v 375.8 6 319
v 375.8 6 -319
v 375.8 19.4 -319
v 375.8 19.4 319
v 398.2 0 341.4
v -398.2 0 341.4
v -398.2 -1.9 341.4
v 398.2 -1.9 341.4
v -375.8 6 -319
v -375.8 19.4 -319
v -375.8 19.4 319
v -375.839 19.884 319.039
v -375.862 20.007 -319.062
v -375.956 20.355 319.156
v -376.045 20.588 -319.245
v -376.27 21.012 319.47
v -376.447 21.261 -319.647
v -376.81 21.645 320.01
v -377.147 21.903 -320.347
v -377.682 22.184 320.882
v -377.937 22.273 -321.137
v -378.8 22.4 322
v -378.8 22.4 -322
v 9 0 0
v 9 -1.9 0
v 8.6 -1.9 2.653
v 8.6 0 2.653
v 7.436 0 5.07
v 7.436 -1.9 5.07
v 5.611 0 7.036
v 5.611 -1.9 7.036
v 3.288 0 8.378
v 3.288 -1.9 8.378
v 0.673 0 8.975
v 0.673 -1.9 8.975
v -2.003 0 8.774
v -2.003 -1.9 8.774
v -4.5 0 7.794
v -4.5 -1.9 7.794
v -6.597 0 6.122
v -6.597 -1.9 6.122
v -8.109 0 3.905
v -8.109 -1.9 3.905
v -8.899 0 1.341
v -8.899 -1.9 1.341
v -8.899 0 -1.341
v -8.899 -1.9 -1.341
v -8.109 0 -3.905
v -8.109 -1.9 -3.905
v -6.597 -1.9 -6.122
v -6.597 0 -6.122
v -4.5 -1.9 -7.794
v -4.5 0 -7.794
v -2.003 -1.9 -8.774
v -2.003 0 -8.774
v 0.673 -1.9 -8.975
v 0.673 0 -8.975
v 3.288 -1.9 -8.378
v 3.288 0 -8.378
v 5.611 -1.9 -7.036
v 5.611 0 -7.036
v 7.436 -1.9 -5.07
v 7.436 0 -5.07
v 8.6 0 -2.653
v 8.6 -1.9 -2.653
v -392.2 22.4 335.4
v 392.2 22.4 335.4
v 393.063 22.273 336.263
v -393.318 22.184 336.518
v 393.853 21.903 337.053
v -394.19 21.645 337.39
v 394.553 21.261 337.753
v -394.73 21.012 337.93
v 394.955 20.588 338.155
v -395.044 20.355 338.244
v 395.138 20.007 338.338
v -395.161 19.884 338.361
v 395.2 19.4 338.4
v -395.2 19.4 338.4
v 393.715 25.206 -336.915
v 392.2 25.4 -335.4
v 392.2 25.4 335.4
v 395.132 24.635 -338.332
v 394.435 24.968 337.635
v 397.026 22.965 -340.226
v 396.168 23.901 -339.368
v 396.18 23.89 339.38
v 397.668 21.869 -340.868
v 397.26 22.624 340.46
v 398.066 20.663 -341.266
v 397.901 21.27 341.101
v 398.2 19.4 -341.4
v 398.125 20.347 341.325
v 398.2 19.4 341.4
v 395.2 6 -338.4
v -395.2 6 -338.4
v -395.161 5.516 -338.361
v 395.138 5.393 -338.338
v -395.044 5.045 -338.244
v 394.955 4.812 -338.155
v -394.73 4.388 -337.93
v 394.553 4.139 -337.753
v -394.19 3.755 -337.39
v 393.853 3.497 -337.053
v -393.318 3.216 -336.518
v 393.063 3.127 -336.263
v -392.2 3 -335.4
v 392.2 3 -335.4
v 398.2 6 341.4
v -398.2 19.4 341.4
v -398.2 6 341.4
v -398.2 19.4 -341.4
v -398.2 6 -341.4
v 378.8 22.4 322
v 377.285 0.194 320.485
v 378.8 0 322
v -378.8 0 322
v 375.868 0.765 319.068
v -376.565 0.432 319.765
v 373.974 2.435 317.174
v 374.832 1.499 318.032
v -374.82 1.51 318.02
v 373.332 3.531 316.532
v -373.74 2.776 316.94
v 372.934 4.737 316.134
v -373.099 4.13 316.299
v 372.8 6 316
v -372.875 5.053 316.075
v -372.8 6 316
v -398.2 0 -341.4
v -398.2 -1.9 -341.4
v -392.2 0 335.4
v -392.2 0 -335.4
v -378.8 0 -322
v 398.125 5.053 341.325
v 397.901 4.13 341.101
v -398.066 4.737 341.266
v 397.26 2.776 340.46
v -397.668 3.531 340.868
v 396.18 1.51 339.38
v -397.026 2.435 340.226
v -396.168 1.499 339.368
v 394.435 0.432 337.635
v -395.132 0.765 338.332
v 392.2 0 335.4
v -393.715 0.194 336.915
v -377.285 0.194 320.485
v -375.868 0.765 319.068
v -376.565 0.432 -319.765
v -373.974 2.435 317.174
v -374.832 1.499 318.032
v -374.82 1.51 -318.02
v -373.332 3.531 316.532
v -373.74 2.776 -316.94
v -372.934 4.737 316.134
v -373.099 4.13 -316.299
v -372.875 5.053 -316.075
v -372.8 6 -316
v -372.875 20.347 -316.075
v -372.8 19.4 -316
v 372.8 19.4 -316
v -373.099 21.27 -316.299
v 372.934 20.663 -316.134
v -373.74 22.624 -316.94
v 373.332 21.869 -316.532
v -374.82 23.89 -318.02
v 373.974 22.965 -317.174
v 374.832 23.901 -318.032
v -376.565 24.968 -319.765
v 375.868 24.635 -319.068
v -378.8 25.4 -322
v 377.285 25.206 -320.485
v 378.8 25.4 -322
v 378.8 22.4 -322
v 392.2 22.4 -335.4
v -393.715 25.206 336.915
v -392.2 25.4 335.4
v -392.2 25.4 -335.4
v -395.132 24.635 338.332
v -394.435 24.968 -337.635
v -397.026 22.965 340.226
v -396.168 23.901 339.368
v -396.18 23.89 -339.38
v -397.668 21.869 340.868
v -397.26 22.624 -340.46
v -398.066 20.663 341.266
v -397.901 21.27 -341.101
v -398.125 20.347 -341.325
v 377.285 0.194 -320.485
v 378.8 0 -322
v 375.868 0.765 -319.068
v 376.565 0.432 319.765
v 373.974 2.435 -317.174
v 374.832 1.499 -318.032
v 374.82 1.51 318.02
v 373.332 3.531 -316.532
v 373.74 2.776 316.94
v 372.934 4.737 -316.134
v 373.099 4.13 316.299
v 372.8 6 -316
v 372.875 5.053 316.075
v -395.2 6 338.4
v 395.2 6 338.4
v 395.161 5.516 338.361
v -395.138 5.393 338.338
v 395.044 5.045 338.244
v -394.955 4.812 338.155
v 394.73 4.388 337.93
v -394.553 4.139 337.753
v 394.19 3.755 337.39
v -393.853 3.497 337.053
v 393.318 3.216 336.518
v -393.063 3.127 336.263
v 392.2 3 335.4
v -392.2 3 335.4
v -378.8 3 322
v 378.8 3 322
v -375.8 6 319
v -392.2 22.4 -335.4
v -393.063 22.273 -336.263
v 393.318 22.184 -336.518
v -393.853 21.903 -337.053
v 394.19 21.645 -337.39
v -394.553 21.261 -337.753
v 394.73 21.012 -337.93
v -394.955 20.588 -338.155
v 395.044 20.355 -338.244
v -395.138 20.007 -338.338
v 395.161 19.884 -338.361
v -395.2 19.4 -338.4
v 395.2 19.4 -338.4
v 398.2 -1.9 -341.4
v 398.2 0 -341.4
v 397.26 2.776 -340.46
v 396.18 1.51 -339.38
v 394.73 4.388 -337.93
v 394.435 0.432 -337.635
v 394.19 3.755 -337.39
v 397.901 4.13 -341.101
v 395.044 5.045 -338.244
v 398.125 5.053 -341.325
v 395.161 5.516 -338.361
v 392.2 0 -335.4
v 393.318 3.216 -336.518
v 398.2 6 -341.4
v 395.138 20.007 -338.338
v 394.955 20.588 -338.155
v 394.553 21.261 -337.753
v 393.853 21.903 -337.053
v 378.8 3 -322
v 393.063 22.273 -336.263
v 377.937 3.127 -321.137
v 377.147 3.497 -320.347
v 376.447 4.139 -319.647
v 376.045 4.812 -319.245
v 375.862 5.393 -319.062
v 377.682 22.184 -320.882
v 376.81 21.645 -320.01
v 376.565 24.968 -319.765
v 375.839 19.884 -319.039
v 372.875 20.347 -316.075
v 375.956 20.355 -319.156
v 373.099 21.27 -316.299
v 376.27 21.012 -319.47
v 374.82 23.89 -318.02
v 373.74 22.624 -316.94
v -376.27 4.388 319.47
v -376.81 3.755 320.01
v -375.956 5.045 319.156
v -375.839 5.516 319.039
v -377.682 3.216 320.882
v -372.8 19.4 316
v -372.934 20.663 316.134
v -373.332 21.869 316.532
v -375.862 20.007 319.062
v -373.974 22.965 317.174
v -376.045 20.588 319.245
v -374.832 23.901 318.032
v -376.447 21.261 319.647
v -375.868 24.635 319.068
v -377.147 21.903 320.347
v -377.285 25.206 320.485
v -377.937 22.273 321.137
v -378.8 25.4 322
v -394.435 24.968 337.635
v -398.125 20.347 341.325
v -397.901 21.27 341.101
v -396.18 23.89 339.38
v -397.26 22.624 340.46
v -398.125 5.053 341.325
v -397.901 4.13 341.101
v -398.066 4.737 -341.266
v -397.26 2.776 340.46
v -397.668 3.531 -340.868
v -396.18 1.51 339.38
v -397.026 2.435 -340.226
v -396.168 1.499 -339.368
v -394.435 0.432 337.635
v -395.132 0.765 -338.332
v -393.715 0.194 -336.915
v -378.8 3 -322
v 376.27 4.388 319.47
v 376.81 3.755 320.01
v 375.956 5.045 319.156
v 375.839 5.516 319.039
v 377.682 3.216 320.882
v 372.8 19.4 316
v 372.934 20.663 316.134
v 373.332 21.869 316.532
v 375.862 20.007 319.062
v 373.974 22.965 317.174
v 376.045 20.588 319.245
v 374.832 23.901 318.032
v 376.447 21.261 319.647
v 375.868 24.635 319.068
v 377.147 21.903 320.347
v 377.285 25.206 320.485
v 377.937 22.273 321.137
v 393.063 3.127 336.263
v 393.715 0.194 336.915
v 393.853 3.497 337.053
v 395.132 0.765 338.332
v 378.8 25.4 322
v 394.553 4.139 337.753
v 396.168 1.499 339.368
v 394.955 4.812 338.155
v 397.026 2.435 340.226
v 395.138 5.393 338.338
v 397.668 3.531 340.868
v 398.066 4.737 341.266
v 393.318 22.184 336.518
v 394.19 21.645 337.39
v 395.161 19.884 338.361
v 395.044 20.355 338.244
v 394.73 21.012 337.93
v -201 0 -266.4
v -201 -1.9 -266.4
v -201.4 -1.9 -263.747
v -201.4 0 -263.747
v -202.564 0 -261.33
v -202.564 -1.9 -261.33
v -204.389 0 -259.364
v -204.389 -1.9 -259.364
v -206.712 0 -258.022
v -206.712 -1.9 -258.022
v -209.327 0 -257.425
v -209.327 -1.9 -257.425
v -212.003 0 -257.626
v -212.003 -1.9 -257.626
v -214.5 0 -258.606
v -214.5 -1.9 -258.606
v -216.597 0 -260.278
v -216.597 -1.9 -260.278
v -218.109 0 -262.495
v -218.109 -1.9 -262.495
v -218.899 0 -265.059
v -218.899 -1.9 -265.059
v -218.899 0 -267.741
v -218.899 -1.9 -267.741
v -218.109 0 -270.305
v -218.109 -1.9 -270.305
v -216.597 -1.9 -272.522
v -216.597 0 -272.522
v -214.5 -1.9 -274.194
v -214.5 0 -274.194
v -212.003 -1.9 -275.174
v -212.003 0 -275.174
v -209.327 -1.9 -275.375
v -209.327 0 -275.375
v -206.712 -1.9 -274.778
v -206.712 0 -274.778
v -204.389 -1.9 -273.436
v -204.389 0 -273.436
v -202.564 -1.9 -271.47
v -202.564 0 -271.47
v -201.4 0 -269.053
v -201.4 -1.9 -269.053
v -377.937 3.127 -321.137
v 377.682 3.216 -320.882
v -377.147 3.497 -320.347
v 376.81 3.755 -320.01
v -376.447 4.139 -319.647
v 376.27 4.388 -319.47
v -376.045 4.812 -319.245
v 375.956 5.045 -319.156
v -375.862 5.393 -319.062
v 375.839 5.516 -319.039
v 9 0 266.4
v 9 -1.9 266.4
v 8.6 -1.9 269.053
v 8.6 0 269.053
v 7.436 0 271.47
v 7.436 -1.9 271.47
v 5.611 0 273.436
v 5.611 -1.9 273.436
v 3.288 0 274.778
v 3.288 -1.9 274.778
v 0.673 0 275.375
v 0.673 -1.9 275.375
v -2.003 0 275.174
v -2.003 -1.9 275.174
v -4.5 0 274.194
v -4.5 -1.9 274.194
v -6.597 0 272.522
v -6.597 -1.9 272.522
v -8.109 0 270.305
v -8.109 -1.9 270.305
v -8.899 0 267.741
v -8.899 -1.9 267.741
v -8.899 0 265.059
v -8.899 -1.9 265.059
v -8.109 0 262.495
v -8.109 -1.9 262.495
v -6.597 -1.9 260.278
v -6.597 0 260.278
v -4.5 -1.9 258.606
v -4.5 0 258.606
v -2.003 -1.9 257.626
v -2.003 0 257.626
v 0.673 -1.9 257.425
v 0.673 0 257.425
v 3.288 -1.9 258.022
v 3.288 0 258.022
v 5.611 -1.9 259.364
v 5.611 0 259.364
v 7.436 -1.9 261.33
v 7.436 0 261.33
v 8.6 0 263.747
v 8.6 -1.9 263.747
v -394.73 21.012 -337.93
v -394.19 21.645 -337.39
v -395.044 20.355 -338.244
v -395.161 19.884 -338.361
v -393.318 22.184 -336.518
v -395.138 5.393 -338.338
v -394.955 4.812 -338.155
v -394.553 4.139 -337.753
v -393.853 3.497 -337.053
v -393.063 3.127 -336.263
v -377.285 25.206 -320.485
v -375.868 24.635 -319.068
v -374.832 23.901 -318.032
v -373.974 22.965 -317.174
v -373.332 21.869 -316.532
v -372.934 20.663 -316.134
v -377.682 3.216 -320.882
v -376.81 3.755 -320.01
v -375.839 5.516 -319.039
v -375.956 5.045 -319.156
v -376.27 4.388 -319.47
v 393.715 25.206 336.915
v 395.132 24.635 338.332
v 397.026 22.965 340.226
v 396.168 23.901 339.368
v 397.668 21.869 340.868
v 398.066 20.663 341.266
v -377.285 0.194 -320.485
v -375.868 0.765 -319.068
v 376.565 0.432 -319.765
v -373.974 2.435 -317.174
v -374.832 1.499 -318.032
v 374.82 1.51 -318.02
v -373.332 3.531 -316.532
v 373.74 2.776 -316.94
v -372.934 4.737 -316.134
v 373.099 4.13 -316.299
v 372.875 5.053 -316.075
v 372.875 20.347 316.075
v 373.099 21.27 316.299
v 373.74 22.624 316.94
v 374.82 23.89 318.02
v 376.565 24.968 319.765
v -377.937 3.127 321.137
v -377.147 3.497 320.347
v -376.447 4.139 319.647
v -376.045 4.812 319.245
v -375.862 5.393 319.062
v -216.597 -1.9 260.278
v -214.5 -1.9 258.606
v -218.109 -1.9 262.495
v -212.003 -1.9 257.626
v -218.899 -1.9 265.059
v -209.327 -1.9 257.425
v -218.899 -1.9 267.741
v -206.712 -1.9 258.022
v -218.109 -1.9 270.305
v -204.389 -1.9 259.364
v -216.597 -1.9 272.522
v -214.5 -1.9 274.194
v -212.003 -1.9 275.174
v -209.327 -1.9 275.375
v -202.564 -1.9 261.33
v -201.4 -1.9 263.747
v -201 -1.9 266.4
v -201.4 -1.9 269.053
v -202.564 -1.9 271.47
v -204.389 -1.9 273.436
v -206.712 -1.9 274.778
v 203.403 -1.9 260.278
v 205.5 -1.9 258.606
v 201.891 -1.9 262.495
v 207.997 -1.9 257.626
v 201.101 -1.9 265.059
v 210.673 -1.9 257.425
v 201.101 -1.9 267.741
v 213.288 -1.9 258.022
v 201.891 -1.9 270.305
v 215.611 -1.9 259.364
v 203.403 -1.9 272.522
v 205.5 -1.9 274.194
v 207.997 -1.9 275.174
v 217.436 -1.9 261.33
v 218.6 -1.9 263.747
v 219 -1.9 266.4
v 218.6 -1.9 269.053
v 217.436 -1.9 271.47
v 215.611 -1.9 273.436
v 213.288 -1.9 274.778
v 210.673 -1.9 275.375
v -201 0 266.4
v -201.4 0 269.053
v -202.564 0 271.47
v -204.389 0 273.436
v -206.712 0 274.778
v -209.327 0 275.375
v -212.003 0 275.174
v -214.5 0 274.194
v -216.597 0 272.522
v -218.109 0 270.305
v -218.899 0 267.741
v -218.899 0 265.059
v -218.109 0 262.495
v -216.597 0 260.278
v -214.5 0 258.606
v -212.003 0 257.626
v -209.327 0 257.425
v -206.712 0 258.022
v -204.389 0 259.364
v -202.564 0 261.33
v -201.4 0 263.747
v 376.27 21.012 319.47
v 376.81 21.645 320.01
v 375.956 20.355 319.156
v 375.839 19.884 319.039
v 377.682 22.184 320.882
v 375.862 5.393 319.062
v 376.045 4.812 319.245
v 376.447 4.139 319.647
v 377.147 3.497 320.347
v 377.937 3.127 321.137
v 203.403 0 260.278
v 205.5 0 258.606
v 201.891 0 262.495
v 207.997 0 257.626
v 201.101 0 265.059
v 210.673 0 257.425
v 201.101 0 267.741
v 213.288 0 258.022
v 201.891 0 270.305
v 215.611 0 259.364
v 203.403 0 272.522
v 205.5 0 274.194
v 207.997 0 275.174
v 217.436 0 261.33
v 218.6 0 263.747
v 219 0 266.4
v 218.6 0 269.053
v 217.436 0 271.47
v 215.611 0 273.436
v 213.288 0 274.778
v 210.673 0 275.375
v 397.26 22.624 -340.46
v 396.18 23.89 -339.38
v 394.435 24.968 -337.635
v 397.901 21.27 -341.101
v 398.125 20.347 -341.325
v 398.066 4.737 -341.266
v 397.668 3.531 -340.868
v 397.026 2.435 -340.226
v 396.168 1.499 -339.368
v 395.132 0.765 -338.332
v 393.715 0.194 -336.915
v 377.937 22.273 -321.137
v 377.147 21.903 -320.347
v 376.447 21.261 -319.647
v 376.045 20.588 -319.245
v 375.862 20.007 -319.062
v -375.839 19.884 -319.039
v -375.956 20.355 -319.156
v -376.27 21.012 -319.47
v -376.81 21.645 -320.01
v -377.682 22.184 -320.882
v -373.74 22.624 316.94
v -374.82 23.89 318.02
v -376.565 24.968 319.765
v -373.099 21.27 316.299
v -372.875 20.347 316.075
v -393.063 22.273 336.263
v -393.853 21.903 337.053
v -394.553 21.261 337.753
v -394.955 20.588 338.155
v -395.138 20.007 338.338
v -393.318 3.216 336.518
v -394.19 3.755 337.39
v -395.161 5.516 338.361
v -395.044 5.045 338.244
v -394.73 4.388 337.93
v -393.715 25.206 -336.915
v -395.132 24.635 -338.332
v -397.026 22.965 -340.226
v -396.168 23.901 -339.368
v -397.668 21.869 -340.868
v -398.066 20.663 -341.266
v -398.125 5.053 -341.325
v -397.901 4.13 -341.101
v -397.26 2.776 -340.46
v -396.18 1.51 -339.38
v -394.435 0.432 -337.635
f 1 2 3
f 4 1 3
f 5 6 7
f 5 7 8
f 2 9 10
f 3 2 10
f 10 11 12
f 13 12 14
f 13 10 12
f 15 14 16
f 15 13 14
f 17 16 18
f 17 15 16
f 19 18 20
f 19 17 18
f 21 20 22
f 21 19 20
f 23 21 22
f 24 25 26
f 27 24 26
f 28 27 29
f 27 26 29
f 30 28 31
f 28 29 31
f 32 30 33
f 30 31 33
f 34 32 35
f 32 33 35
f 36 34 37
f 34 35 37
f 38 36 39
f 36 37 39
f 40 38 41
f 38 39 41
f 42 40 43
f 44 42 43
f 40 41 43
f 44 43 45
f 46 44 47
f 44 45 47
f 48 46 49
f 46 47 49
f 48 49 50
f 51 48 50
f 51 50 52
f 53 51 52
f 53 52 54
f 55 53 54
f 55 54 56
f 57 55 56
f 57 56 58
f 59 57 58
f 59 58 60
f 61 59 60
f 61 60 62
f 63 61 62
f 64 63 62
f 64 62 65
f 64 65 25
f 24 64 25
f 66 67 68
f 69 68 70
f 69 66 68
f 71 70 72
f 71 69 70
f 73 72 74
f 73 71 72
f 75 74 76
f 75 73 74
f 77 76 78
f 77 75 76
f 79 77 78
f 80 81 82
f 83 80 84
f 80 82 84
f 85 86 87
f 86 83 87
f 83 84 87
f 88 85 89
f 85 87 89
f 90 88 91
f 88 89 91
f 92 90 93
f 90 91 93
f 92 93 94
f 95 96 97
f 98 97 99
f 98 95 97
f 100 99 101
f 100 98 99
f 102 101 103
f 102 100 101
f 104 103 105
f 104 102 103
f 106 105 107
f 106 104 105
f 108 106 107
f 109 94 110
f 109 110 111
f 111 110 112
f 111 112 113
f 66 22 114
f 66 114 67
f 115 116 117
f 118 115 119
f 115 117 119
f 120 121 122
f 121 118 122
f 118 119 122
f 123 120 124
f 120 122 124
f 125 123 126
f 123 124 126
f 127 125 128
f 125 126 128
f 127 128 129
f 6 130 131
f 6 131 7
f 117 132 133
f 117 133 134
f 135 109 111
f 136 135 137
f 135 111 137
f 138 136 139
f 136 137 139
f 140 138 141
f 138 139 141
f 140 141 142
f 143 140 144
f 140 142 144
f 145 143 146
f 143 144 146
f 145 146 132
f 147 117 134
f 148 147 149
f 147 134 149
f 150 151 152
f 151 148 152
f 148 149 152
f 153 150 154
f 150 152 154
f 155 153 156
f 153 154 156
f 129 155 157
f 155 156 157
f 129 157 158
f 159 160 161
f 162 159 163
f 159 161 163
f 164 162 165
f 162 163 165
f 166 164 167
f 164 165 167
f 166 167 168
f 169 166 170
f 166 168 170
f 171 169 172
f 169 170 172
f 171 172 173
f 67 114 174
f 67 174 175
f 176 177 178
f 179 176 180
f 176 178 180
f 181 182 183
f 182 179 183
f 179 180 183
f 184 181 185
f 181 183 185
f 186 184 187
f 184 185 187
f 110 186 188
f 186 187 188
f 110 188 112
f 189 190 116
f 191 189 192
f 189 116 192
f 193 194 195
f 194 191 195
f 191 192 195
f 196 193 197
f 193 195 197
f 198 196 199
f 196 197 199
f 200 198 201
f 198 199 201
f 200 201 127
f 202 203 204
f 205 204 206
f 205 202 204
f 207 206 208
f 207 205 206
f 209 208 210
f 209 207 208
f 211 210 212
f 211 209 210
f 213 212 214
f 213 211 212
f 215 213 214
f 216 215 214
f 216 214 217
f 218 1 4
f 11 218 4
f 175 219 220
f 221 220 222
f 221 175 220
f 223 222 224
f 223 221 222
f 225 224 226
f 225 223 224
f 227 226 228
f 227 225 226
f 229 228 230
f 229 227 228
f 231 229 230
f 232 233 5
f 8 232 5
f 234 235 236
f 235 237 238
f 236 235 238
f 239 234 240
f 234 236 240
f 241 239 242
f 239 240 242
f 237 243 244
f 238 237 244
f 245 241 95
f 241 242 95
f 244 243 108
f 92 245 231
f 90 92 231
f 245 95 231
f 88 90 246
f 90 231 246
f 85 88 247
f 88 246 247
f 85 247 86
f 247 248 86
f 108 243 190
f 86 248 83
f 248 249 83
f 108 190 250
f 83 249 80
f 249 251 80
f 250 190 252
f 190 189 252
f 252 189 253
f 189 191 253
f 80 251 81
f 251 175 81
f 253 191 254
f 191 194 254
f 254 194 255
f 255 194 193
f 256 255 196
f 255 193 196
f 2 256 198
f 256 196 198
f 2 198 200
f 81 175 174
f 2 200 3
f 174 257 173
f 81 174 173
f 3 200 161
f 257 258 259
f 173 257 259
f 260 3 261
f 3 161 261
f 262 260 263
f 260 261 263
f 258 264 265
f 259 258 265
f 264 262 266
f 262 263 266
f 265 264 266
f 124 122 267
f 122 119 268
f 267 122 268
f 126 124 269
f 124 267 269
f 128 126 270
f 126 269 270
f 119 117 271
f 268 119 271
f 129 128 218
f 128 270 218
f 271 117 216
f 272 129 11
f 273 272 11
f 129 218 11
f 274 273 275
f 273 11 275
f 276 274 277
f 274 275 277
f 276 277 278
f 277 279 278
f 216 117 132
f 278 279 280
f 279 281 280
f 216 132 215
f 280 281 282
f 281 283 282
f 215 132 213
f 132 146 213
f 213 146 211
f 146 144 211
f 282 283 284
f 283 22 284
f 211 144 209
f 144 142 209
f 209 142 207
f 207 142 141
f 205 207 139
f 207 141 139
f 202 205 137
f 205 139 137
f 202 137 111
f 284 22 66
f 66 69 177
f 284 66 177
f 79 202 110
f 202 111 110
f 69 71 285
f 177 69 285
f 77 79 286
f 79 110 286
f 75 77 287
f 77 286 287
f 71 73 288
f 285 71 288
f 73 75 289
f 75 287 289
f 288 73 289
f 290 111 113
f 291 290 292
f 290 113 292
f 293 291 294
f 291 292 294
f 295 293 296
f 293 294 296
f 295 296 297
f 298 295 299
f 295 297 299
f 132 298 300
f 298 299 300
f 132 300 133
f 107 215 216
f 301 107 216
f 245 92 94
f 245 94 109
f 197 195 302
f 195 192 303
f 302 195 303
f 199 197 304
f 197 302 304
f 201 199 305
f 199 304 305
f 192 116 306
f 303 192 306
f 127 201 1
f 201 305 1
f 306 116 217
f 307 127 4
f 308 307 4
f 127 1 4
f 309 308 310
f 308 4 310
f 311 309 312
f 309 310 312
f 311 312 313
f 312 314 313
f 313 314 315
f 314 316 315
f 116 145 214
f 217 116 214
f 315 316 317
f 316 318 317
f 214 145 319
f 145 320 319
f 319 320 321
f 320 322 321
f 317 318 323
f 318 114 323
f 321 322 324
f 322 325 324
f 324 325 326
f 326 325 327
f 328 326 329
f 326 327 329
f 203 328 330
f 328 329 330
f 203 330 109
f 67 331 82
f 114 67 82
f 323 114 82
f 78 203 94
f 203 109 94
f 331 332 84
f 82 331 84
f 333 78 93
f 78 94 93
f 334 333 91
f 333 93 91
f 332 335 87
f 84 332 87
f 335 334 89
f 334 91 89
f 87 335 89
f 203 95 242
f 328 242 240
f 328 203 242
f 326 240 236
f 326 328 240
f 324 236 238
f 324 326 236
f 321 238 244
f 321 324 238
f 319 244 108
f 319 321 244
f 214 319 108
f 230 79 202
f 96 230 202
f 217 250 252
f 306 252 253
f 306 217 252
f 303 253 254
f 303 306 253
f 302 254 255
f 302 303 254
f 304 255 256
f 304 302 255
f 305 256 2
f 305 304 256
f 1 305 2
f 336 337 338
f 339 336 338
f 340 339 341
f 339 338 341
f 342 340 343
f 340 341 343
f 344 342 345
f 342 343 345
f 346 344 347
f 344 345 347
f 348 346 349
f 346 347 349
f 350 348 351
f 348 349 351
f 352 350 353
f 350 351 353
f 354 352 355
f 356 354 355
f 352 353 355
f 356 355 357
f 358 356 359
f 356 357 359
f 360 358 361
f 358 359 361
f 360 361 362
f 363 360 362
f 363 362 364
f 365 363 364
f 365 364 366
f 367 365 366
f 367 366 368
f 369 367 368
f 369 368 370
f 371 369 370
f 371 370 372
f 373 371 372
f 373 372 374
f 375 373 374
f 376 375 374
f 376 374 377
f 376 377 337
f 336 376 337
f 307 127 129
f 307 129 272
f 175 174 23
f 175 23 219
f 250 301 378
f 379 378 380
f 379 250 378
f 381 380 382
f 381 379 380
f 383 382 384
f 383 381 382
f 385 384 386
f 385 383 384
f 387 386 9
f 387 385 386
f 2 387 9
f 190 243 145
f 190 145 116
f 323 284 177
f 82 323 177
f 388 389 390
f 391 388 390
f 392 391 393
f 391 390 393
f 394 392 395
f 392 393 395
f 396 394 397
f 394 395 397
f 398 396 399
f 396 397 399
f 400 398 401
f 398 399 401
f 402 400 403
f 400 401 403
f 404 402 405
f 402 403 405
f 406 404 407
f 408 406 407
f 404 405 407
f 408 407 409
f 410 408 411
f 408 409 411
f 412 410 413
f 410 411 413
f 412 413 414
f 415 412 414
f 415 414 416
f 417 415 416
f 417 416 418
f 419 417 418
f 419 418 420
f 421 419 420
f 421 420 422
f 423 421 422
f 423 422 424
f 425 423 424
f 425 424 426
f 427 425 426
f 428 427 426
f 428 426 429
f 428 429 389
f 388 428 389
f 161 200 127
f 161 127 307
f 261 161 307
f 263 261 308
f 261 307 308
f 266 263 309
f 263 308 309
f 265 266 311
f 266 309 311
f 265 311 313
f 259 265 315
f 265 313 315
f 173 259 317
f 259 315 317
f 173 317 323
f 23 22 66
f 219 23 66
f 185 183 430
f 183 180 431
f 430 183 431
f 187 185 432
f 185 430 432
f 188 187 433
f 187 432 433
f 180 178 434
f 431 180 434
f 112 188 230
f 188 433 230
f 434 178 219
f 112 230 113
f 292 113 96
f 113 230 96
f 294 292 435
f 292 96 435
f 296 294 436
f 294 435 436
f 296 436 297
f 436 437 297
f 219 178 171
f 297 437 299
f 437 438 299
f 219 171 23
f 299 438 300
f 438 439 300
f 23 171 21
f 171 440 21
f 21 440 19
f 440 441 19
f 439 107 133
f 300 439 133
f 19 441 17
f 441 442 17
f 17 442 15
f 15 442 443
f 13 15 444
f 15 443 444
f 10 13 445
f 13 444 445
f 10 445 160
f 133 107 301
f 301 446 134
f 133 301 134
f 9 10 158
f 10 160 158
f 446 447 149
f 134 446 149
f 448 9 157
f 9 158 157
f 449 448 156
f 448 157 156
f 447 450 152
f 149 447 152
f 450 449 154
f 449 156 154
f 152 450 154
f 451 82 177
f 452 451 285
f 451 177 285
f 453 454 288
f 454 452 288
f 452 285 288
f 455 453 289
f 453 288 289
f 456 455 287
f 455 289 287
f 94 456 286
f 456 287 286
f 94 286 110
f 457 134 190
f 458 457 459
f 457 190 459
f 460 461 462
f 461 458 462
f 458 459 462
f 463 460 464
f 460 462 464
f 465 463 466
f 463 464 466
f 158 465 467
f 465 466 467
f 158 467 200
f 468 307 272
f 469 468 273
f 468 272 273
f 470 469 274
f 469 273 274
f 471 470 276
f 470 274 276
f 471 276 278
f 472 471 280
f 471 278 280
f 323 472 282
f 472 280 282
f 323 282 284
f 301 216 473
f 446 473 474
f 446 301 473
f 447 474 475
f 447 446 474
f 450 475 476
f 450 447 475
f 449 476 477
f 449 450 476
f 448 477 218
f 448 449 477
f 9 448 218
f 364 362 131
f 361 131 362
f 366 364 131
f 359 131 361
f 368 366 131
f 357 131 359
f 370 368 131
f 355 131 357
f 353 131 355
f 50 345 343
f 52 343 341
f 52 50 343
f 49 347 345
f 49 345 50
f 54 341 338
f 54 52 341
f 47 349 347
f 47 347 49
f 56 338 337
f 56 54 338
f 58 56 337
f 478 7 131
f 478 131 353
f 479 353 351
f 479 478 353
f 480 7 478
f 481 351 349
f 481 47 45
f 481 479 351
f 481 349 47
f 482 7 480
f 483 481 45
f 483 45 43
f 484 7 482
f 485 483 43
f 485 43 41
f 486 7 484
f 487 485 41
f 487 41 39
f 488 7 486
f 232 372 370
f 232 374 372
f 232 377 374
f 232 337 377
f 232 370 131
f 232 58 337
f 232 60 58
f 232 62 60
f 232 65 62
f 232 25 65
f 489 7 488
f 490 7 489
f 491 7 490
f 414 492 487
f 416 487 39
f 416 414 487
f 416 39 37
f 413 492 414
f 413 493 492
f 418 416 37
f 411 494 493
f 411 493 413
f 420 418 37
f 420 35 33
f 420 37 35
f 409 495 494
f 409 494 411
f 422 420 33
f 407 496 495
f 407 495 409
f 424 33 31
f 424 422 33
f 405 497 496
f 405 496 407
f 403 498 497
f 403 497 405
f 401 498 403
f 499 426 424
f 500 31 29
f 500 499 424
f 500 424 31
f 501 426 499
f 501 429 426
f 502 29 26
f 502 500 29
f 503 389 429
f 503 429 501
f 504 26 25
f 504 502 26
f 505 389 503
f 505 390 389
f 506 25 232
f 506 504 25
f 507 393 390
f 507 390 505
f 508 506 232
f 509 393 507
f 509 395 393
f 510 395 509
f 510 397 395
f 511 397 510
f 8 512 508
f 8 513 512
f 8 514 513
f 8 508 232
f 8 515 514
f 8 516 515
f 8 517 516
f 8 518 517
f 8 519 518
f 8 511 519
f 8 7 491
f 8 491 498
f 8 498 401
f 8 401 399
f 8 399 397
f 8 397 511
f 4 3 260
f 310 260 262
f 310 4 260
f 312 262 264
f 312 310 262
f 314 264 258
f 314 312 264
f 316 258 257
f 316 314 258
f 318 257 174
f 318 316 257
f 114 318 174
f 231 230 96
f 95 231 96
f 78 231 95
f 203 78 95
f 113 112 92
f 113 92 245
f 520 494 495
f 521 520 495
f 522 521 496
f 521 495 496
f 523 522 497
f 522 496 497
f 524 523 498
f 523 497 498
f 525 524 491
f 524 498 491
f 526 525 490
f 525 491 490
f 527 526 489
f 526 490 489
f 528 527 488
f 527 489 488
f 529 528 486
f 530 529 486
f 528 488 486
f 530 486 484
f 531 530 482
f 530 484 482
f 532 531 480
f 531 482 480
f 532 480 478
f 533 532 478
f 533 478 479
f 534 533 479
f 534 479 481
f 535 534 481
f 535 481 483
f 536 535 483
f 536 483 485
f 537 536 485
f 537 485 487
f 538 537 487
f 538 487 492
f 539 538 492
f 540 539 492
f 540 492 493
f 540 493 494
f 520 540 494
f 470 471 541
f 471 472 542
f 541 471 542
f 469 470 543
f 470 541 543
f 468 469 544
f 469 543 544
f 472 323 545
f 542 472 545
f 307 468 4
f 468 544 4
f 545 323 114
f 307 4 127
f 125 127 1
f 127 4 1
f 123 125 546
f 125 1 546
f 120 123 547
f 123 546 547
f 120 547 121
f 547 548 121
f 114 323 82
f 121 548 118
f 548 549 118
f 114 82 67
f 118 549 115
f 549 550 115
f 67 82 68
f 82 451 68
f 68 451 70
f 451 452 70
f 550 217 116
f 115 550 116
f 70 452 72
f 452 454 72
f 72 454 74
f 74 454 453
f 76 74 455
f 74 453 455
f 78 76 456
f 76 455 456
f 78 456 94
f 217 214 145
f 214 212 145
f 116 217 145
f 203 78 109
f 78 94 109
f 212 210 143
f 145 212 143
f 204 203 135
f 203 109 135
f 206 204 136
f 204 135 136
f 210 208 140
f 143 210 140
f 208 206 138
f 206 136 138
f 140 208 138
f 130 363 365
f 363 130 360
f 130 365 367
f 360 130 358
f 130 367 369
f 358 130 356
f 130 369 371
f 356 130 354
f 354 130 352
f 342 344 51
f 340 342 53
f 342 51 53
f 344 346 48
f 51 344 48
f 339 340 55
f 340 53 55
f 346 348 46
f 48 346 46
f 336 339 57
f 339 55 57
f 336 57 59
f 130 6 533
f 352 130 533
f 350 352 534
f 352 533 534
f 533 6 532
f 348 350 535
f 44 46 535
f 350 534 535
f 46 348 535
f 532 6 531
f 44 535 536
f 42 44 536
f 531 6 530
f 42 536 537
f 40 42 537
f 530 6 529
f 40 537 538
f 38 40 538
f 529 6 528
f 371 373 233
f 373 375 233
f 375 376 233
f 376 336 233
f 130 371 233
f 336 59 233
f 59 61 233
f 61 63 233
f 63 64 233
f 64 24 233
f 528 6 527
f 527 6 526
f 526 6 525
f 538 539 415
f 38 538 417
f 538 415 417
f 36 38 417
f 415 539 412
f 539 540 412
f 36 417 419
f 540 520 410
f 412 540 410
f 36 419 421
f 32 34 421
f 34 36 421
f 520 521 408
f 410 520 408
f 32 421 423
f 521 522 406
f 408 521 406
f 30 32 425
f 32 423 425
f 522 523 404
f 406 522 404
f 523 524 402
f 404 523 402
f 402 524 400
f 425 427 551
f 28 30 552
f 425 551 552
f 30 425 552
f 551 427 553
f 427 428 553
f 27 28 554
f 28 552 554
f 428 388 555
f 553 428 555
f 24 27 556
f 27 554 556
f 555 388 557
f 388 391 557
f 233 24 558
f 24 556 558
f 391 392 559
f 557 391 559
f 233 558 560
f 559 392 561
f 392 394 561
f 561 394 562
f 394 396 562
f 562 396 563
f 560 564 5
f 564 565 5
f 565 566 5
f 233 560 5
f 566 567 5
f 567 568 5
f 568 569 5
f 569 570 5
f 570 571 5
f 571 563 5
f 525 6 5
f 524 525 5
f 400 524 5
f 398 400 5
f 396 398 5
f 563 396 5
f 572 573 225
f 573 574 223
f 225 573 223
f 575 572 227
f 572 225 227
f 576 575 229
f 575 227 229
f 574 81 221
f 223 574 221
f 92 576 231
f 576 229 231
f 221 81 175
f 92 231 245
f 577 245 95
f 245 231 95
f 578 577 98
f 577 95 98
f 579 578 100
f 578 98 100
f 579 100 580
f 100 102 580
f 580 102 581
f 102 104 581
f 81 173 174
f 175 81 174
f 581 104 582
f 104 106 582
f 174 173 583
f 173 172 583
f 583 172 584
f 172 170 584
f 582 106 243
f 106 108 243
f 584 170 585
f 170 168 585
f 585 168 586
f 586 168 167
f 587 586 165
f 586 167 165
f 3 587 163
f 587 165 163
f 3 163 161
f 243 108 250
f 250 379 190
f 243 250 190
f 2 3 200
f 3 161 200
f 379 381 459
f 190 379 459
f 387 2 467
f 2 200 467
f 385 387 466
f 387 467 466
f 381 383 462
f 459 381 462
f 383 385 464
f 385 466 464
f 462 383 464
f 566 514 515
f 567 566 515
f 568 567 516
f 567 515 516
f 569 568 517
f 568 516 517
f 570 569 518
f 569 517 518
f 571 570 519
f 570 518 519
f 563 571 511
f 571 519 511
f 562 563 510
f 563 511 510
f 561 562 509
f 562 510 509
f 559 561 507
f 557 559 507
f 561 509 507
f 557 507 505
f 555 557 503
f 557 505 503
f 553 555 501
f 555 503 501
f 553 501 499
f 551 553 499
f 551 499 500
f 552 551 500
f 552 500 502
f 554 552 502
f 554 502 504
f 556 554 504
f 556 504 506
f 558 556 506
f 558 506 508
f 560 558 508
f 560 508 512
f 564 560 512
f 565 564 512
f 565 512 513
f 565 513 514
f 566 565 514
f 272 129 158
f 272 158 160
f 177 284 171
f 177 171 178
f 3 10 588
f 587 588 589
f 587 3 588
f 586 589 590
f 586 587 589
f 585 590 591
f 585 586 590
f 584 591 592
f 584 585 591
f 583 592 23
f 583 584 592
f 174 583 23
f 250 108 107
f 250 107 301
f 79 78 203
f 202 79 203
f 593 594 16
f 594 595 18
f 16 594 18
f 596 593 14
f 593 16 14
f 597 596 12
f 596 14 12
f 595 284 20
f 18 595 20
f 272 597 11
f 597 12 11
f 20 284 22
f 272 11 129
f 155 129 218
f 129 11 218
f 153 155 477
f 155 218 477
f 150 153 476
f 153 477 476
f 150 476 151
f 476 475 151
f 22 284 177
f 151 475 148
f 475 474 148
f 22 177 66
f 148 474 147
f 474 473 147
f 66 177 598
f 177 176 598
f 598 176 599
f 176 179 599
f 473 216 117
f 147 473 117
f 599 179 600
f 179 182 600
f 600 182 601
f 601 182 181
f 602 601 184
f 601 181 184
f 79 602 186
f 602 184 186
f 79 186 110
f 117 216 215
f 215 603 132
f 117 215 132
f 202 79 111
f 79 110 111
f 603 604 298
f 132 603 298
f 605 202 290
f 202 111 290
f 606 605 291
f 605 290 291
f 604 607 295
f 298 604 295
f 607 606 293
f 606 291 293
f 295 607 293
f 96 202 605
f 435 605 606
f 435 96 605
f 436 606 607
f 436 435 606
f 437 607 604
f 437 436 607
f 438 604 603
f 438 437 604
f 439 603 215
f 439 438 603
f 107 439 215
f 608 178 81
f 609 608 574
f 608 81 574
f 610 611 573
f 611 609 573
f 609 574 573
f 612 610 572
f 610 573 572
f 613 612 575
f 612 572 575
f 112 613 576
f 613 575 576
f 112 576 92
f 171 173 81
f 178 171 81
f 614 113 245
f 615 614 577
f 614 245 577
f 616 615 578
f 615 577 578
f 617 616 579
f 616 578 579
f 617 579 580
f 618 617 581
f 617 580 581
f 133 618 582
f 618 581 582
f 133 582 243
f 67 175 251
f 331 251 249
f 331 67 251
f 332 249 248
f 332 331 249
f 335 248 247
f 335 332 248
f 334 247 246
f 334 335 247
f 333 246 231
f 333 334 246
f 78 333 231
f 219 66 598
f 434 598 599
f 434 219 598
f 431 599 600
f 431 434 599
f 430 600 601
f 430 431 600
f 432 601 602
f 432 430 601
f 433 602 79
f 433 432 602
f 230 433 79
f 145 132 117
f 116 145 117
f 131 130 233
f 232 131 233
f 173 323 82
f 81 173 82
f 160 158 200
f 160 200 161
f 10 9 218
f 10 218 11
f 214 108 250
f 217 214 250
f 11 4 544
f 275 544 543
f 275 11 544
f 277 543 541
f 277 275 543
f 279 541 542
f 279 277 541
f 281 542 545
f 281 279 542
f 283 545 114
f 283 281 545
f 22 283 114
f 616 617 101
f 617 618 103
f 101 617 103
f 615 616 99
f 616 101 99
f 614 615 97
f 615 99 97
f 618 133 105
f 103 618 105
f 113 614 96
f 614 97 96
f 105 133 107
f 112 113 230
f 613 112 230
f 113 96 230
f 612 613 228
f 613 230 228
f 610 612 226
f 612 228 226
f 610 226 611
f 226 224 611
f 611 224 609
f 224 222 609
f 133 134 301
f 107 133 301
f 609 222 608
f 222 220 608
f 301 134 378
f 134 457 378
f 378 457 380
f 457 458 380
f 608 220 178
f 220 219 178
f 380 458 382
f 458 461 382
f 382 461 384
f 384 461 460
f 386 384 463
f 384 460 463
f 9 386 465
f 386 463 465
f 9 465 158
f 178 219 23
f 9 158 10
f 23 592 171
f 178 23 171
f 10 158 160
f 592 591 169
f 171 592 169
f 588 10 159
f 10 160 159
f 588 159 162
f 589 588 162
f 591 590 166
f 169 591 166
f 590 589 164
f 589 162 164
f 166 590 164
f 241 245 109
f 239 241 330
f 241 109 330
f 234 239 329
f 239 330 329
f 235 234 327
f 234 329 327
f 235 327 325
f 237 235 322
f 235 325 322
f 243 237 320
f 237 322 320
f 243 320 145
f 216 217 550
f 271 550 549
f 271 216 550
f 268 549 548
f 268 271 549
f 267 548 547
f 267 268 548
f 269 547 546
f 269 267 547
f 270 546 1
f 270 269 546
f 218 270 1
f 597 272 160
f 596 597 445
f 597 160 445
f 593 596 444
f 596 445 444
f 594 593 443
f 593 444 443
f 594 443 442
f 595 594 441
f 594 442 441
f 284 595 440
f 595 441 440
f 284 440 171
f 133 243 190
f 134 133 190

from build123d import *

# Parameters (mm, degrees)
TUBO_CUADRADO_2_X_2_X_0_25_1_DEPTH      = 719.721024484
TUBO_CUADRADO_2_X_2_X_0_25_1_DEPTH_BACK = 36.921024484
TUBO_CUADRADO_2_X_2_X_0_25_1_2_DEPTH    = 870.242048969
TUBO_CUADRADO_2_X_2_X_0_25_1_3_DEPTH    = 756.642048969
TUBO_CUADRADO_2_X_2_X_0_25_1_4_DEPTH    = 870.242048969
CROQUIS3_W                              = 796.4
CROQUIS3_H                              = 682.8
SALIENTE_EXTRUIR1_DEPTH                 = 1.9
CROQUIS6_R                              = 9
CORTAR_EXTRUIR2_DEPTH                   = 10


with BuildPart() as part:
    # Sketch1 → Tubo cuadrado 2 X 2 X 0.25(1) (new, two sides: drawn at the far end of the back side and taken through both)
    with BuildSketch(Plane(origin=(-385.5, 12.7, -341.4), x_dir=(1, 0, 0), z_dir=(0, 0, 1)).offset(-TUBO_CUADRADO_2_X_2_X_0_25_1_DEPTH_BACK)):
        with BuildLine():
            Line((-6.7, -12.7), (6.7, -12.7))
            ThreePointArc((6.7, -12.7), (10.942640687, -10.942640687), (12.7, -6.7))
            Line((12.7, -6.7), (12.7, 6.7))
            ThreePointArc((12.7, 6.7), (10.942640687, 10.942640687), (6.7, 12.7))
            Line((6.7, 12.7), (-6.7, 12.7))
            ThreePointArc((-6.7, 12.7), (-10.942640687, 10.942640687), (-12.7, 6.7))
            Line((-12.7, 6.7), (-12.7, -6.7))
            ThreePointArc((-12.7, -6.7), (-10.942640687, -10.942640687), (-6.7, -12.7))
        make_face()
        with BuildLine():
            Line((-6.7, -9.7), (6.7, -9.7))
            ThreePointArc((6.7, -9.7), (8.821320344, -8.821320344), (9.7, -6.7))
            Line((9.7, -6.7), (9.7, 6.7))
            ThreePointArc((9.7, 6.7), (8.821320344, 8.821320344), (6.7, 9.7))
            Line((6.7, 9.7), (-6.7, 9.7))
            ThreePointArc((-6.7, 9.7), (-8.821320344, 8.821320344), (-9.7, 6.7))
            Line((-9.7, 6.7), (-9.7, -6.7))
            ThreePointArc((-9.7, -6.7), (-8.821320344, -8.821320344), (-6.7, -9.7))
        make_face(mode=Mode.SUBTRACT)
    extrude(amount=TUBO_CUADRADO_2_X_2_X_0_25_1_DEPTH + TUBO_CUADRADO_2_X_2_X_0_25_1_DEPTH_BACK)

    # Tubo cuadrado 2 X 2 X 0.25(1) mitre 1
    split(bisect_by=Plane(origin=(-398.2, 0, -341.4), x_dir=(0, -1, 0), z_dir=(-0.707106781, 0, 0.707106781)), keep=Keep.TOP)

    # Tubo cuadrado 2 X 2 X 0.25(1) mitre 2
    split(bisect_by=Plane(origin=(-398.2, 0, 341.4), x_dir=(0, -1, 0), z_dir=(-0.707106781, 0, -0.707106781)), keep=Keep.TOP)


with BuildPart() as body_2:
    # Sketch1 on segment 2 (carried to segment 2) → Tubo cuadrado 2 X 2 X 0.25_1 2 (new body)
    with BuildSketch(Plane(origin=(-435.121024484, 12.7, 328.7), x_dir=(0, 0, -1), z_dir=(1, 0, 0))):
        with BuildLine():
            Line((-6.7, -12.7), (6.7, -12.7))
            ThreePointArc((6.7, -12.7), (10.942640687, -10.942640687), (12.7, -6.7))
            Line((12.7, -6.7), (12.7, 6.7))
            ThreePointArc((12.7, 6.7), (10.942640687, 10.942640687), (6.7, 12.7))
            Line((6.7, 12.7), (-6.7, 12.7))
            ThreePointArc((-6.7, 12.7), (-10.942640687, 10.942640687), (-12.7, 6.7))
            Line((-12.7, 6.7), (-12.7, -6.7))
            ThreePointArc((-12.7, -6.7), (-10.942640687, -10.942640687), (-6.7, -12.7))
        make_face()
        with BuildLine():
            Line((-6.7, -9.7), (6.7, -9.7))
            ThreePointArc((6.7, -9.7), (8.821320344, -8.821320344), (9.7, -6.7))
            Line((9.7, -6.7), (9.7, 6.7))
            ThreePointArc((9.7, 6.7), (8.821320344, 8.821320344), (6.7, 9.7))
            Line((6.7, 9.7), (-6.7, 9.7))
            ThreePointArc((-6.7, 9.7), (-8.821320344, 8.821320344), (-9.7, 6.7))
            Line((-9.7, 6.7), (-9.7, -6.7))
            ThreePointArc((-9.7, -6.7), (-8.821320344, -8.821320344), (-6.7, -9.7))
        make_face(mode=Mode.SUBTRACT)
    extrude(amount=TUBO_CUADRADO_2_X_2_X_0_25_1_2_DEPTH)

    # Tubo cuadrado 2 X 2 X 0.25_1 2 mitre 1
    split(bisect_by=Plane(origin=(-398.2, 0, 341.4), x_dir=(0, 1, 0), z_dir=(0.707106781, 0, 0.707106781)), keep=Keep.TOP)

    # Tubo cuadrado 2 X 2 X 0.25_1 2 mitre 2
    split(bisect_by=Plane(origin=(398.2, 0, 341.4), x_dir=(0, -1, 0), z_dir=(-0.707106781, 0, 0.707106781)), keep=Keep.TOP)


with BuildPart() as body_3:
    # Sketch1 on segment 3 (carried to segment 3) → Tubo cuadrado 2 X 2 X 0.25_1 3 (new body)
    with BuildSketch(Plane(origin=(385.5, 12.7, 378.321024484), x_dir=(-1, 0, 0), z_dir=(0, 0, -1))):
        with BuildLine():
            Line((-6.7, -12.7), (6.7, -12.7))
            ThreePointArc((6.7, -12.7), (10.942640687, -10.942640687), (12.7, -6.7))
            Line((12.7, -6.7), (12.7, 6.7))
            ThreePointArc((12.7, 6.7), (10.942640687, 10.942640687), (6.7, 12.7))
            Line((6.7, 12.7), (-6.7, 12.7))
            ThreePointArc((-6.7, 12.7), (-10.942640687, 10.942640687), (-12.7, 6.7))
            Line((-12.7, 6.7), (-12.7, -6.7))
            ThreePointArc((-12.7, -6.7), (-10.942640687, -10.942640687), (-6.7, -12.7))
        make_face()
        with BuildLine():
            Line((-6.7, -9.7), (6.7, -9.7))
            ThreePointArc((6.7, -9.7), (8.821320344, -8.821320344), (9.7, -6.7))
            Line((9.7, -6.7), (9.7, 6.7))
            ThreePointArc((9.7, 6.7), (8.821320344, 8.821320344), (6.7, 9.7))
            Line((6.7, 9.7), (-6.7, 9.7))
            ThreePointArc((-6.7, 9.7), (-8.821320344, 8.821320344), (-9.7, 6.7))
            Line((-9.7, 6.7), (-9.7, -6.7))
            ThreePointArc((-9.7, -6.7), (-8.821320344, -8.821320344), (-6.7, -9.7))
        make_face(mode=Mode.SUBTRACT)
    extrude(amount=TUBO_CUADRADO_2_X_2_X_0_25_1_3_DEPTH)

    # Tubo cuadrado 2 X 2 X 0.25_1 3 mitre 1
    split(bisect_by=Plane(origin=(398.2, 0, -341.4), x_dir=(0, 1, 0), z_dir=(0.707106781, 0, 0.707106781)), keep=Keep.TOP)

    # Tubo cuadrado 2 X 2 X 0.25_1 3 mitre 2
    split(bisect_by=Plane(origin=(398.2, 0, 341.4), x_dir=(0, 1, 0), z_dir=(0.707106781, 0, -0.707106781)), keep=Keep.TOP)


with BuildPart() as body_4:
    # Sketch1 on segment 4 (carried to segment 4) → Tubo cuadrado 2 X 2 X 0.25_1 4 (new body)
    with BuildSketch(Plane(origin=(435.121024484, 12.7, -328.7), x_dir=(0, 0, 1), z_dir=(-1, 0, 0))):
        with BuildLine():
            Line((-6.7, -12.7), (6.7, -12.7))
            ThreePointArc((6.7, -12.7), (10.942640687, -10.942640687), (12.7, -6.7))
            Line((12.7, -6.7), (12.7, 6.7))
            ThreePointArc((12.7, 6.7), (10.942640687, 10.942640687), (6.7, 12.7))
            Line((6.7, 12.7), (-6.7, 12.7))
            ThreePointArc((-6.7, 12.7), (-10.942640687, 10.942640687), (-12.7, 6.7))
            Line((-12.7, 6.7), (-12.7, -6.7))
            ThreePointArc((-12.7, -6.7), (-10.942640687, -10.942640687), (-6.7, -12.7))
        make_face()
        with BuildLine():
            Line((-6.7, -9.7), (6.7, -9.7))
            ThreePointArc((6.7, -9.7), (8.821320344, -8.821320344), (9.7, -6.7))
            Line((9.7, -6.7), (9.7, 6.7))
            ThreePointArc((9.7, 6.7), (8.821320344, 8.821320344), (6.7, 9.7))
            Line((6.7, 9.7), (-6.7, 9.7))
            ThreePointArc((-6.7, 9.7), (-8.821320344, 8.821320344), (-9.7, 6.7))
            Line((-9.7, 6.7), (-9.7, -6.7))
            ThreePointArc((-9.7, -6.7), (-8.821320344, -8.821320344), (-6.7, -9.7))
        make_face(mode=Mode.SUBTRACT)
    extrude(amount=TUBO_CUADRADO_2_X_2_X_0_25_1_4_DEPTH)

    # Tubo cuadrado 2 X 2 X 0.25_1 4 mitre 1
    split(bisect_by=Plane(origin=(-398.2, 0, -341.4), x_dir=(0, 1, 0), z_dir=(0.707106781, 0, -0.707106781)), keep=Keep.TOP)

    # Tubo cuadrado 2 X 2 X 0.25_1 4 mitre 2
    split(bisect_by=Plane(origin=(398.2, 0, -341.4), x_dir=(0, -1, 0), z_dir=(-0.707106781, 0, -0.707106781)), keep=Keep.TOP)


with BuildPart() as body_5:
    # Croquis3 → Saliente-Extruir1 (new body)
    with BuildSketch(Plane.XZ):
        Rectangle(CROQUIS3_W, CROQUIS3_H)
    extrude(amount=SALIENTE_EXTRUIR1_DEPTH)

    # Croquis6 → Cortar-Extruir2 (cut)
    with BuildSketch(Plane.XZ.offset(1.9)):
        Circle(CROQUIS6_R)
        with Locations((210, 266.4)):
            Circle(CROQUIS6_R)
        with Locations((0, 266.4)):
            Circle(CROQUIS6_R)
        with Locations((-210, 266.4)):
            Circle(CROQUIS6_R)
        with Locations((-210, -266.4)):
            Circle(CROQUIS6_R)
    extrude(amount=-CORTAR_EXTRUIR2_DEPTH, mode=Mode.SUBTRACT)


solid = Compound([part.part, body_2.part, body_3.part, body_4.part, body_5.part])
